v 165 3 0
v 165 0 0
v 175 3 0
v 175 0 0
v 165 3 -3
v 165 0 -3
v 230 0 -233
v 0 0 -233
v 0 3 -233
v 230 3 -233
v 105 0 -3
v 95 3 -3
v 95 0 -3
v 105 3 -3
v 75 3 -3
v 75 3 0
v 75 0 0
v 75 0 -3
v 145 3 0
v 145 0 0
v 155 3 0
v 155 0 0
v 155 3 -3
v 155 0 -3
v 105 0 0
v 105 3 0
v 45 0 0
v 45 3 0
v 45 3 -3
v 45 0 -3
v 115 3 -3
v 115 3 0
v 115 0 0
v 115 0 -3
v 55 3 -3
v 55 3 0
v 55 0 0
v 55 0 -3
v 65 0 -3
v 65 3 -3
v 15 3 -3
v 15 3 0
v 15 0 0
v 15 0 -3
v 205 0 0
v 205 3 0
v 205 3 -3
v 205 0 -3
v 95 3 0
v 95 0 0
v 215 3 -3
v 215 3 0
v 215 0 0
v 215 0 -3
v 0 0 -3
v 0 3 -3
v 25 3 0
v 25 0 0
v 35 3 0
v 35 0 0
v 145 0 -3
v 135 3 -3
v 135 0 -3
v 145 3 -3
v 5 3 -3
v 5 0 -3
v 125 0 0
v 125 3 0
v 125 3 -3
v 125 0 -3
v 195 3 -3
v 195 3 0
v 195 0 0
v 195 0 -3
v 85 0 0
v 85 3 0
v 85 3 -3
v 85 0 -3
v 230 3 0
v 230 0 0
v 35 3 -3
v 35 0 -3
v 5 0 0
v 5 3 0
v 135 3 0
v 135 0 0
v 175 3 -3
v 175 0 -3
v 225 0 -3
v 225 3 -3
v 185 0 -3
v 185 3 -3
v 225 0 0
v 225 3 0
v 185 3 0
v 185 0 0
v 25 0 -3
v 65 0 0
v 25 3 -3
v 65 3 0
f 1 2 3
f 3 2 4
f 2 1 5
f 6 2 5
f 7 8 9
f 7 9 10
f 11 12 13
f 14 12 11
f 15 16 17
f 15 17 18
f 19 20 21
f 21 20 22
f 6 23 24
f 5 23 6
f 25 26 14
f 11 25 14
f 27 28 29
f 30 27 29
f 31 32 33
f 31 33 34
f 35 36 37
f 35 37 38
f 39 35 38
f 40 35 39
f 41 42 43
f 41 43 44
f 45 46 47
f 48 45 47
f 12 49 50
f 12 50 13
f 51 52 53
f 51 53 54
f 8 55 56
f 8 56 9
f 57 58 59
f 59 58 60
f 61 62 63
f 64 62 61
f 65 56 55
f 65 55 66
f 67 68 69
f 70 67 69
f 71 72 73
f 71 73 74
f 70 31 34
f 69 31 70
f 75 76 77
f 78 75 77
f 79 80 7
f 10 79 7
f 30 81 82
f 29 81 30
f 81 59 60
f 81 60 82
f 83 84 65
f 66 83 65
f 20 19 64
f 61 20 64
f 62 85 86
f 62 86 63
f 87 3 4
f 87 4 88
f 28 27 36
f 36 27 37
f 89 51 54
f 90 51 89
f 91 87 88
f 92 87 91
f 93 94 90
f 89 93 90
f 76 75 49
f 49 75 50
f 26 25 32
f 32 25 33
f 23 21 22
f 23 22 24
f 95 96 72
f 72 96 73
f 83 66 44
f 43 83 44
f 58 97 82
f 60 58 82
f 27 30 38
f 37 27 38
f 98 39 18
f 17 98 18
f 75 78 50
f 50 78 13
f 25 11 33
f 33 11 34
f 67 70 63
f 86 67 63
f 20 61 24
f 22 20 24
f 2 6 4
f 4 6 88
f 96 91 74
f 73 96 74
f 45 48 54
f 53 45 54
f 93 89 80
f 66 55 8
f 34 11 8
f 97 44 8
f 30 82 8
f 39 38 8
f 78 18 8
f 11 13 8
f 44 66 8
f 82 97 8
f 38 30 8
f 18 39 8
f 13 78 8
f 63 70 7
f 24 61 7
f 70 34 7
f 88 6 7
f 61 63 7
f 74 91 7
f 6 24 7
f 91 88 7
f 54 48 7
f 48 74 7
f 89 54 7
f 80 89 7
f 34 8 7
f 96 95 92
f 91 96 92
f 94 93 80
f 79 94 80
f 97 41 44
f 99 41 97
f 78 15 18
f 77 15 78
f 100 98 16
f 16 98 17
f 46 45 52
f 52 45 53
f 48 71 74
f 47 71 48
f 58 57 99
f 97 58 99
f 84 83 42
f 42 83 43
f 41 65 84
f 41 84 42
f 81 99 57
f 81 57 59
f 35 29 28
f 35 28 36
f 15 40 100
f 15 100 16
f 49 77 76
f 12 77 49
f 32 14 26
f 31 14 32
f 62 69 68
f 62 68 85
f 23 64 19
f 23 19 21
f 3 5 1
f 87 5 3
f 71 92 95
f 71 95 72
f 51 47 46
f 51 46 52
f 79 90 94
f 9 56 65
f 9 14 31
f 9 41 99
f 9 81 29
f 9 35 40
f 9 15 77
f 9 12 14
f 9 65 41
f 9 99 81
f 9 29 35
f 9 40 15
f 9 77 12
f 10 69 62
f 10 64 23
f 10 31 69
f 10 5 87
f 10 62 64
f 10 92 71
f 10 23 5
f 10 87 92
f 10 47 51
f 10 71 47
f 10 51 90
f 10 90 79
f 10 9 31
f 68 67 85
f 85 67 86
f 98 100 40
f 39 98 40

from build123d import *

# Parameters (mm, degrees)
ESQUISSE1_W             = 230
ESQUISSE1_H             = 233
BASE_DEPTH              = 3
ENL_V_MAT_EXTRU_1_REACH = 5
ESQUISSE2_W             = 10
ESQUISSE2_H             = 3


with BuildPart() as part:
    # Esquisse1 → Base (new body)
    with BuildSketch(Plane(origin=(0, 0, 0), x_dir=(1, 0, 0), z_dir=(0, 1, 0))):
        with Locations((115, 116.5)):
            Rectangle(ESQUISSE1_W, ESQUISSE1_H)
    extrude(amount=BASE_DEPTH)

    # Esquisse2 → Enlèv. mat.-Extru.1 (cut, up to next)
    with BuildSketch(Plane(origin=(0, 3, 0), x_dir=(1, 0, 0), z_dir=(0, 1, 0)), mode=Mode.PRIVATE) as enl_v_mat_extru_1_sk1:
        with Locations((120, 1.5)):
            Rectangle(ESQUISSE2_W, ESQUISSE2_H)
    enl_v_mat_extru_1_tool1 = extrude(enl_v_mat_extru_1_sk1.sketch, amount=-ENL_V_MAT_EXTRU_1_REACH, mode=Mode.PRIVATE) & part.part
    add(enl_v_mat_extru_1_tool1.solids().sort_by_distance((120, 3, -1.5))[0], mode=Mode.SUBTRACT)
    # Esquisse2 → Enlèv. mat.-Extru.1 (cut, up to next)
    with BuildSketch(Plane(origin=(0, 3, 0), x_dir=(1, 0, 0), z_dir=(0, 1, 0)), mode=Mode.PRIVATE) as enl_v_mat_extru_1_sk2:
        with Locations((140, 1.5)):
            Rectangle(ESQUISSE2_W, ESQUISSE2_H)
    enl_v_mat_extru_1_tool2 = extrude(enl_v_mat_extru_1_sk2.sketch, amount=-ENL_V_MAT_EXTRU_1_REACH, mode=Mode.PRIVATE) & part.part
    add(enl_v_mat_extru_1_tool2.solids().sort_by_distance((140, 3, -1.5))[0], mode=Mode.SUBTRACT)
    # Esquisse2 → Enlèv. mat.-Extru.1 (cut, up to next)
    with BuildSketch(Plane(origin=(0, 3, 0), x_dir=(1, 0, 0), z_dir=(0, 1, 0)), mode=Mode.PRIVATE) as enl_v_mat_extru_1_sk3:
        with Locations((160, 1.5)):
            Rectangle(ESQUISSE2_W, ESQUISSE2_H)
    enl_v_mat_extru_1_tool3 = extrude(enl_v_mat_extru_1_sk3.sketch, amount=-ENL_V_MAT_EXTRU_1_REACH, mode=Mode.PRIVATE) & part.part
    add(enl_v_mat_extru_1_tool3.solids().sort_by_distance((160, 3, -1.5))[0], mode=Mode.SUBTRACT)
    # Esquisse2 → Enlèv. mat.-Extru.1 (cut, up to next)
    with BuildSketch(Plane(origin=(0, 3, 0), x_dir=(1, 0, 0), z_dir=(0, 1, 0)), mode=Mode.PRIVATE) as enl_v_mat_extru_1_sk4:
        with Locations((180, 1.5)):
            Rectangle(ESQUISSE2_W, ESQUISSE2_H)
    enl_v_mat_extru_1_tool4 = extrude(enl_v_mat_extru_1_sk4.sketch, amount=-ENL_V_MAT_EXTRU_1_REACH, mode=Mode.PRIVATE) & part.part
    add(enl_v_mat_extru_1_tool4.solids().sort_by_distance((180, 3, -1.5))[0], mode=Mode.SUBTRACT)
    # Esquisse2 → Enlèv. mat.-Extru.1 (cut, up to next)
    with BuildSketch(Plane(origin=(0, 3, 0), x_dir=(1, 0, 0), z_dir=(0, 1, 0)), mode=Mode.PRIVATE) as enl_v_mat_extru_1_sk5:
        with Locations((200, 1.5)):
            Rectangle(ESQUISSE2_W, ESQUISSE2_H)
    enl_v_mat_extru_1_tool5 = extrude(enl_v_mat_extru_1_sk5.sketch, amount=-ENL_V_MAT_EXTRU_1_REACH, mode=Mode.PRIVATE) & part.part
    add(enl_v_mat_extru_1_tool5.solids().sort_by_distance((200, 3, -1.5))[0], mode=Mode.SUBTRACT)
    # Esquisse2 → Enlèv. mat.-Extru.1 (cut, up to next)
    with BuildSketch(Plane(origin=(0, 3, 0), x_dir=(1, 0, 0), z_dir=(0, 1, 0)), mode=Mode.PRIVATE) as enl_v_mat_extru_1_sk6:
        with Locations((220, 1.5)):
            Rectangle(ESQUISSE2_W, ESQUISSE2_H)
    enl_v_mat_extru_1_tool6 = extrude(enl_v_mat_extru_1_sk6.sketch, amount=-ENL_V_MAT_EXTRU_1_REACH, mode=Mode.PRIVATE) & part.part
    add(enl_v_mat_extru_1_tool6.solids().sort_by_distance((220, 3, -1.5))[0], mode=Mode.SUBTRACT)
    # Esquisse2 → Enlèv. mat.-Extru.1 (cut, up to next)
    with BuildSketch(Plane(origin=(0, 3, 0), x_dir=(1, 0, 0), z_dir=(0, 1, 0)), mode=Mode.PRIVATE) as enl_v_mat_extru_1_sk7:
        with Locations((100, 1.5)):
            Rectangle(ESQUISSE2_W, ESQUISSE2_H)
    enl_v_mat_extru_1_tool7 = extrude(enl_v_mat_extru_1_sk7.sketch, amount=-ENL_V_MAT_EXTRU_1_REACH, mode=Mode.PRIVATE) & part.part
    add(enl_v_mat_extru_1_tool7.solids().sort_by_distance((100, 3, -1.5))[0], mode=Mode.SUBTRACT)
    # Esquisse2 → Enlèv. mat.-Extru.1 (cut, up to next)
    with BuildSketch(Plane(origin=(0, 3, 0), x_dir=(1, 0, 0), z_dir=(0, 1, 0)), mode=Mode.PRIVATE) as enl_v_mat_extru_1_sk8:
        with Locations((80, 1.5)):
            Rectangle(ESQUISSE2_W, ESQUISSE2_H)
    enl_v_mat_extru_1_tool8 = extrude(enl_v_mat_extru_1_sk8.sketch, amount=-ENL_V_MAT_EXTRU_1_REACH, mode=Mode.PRIVATE) & part.part
    add(enl_v_mat_extru_1_tool8.solids().sort_by_distance((80, 3, -1.5))[0], mode=Mode.SUBTRACT)
    # Esquisse2 → Enlèv. mat.-Extru.1 (cut, up to next)
    with BuildSketch(Plane(origin=(0, 3, 0), x_dir=(1, 0, 0), z_dir=(0, 1, 0)), mode=Mode.PRIVATE) as enl_v_mat_extru_1_sk9:
        with Locations((60, 1.5)):
            Rectangle(ESQUISSE2_W, ESQUISSE2_H)
    enl_v_mat_extru_1_tool9 = extrude(enl_v_mat_extru_1_sk9.sketch, amount=-ENL_V_MAT_EXTRU_1_REACH, mode=Mode.PRIVATE) & part.part
    add(enl_v_mat_extru_1_tool9.solids().sort_by_distance((60, 3, -1.5))[0], mode=Mode.SUBTRACT)
    # Esquisse2 → Enlèv. mat.-Extru.1 (cut, up to next)
    with BuildSketch(Plane(origin=(0, 3, 0), x_dir=(1, 0, 0), z_dir=(0, 1, 0)), mode=Mode.PRIVATE) as enl_v_mat_extru_1_sk10:
        with Locations((40, 1.5)):
            Rectangle(ESQUISSE2_W, ESQUISSE2_H)
    enl_v_mat_extru_1_tool10 = extrude(enl_v_mat_extru_1_sk10.sketch, amount=-ENL_V_MAT_EXTRU_1_REACH, mode=Mode.PRIVATE) & part.part
    add(enl_v_mat_extru_1_tool10.solids().sort_by_distance((40, 3, -1.5))[0], mode=Mode.SUBTRACT)
    # Esquisse2 → Enlèv. mat.-Extru.1 (cut, up to next)
    with BuildSketch(Plane(origin=(0, 3, 0), x_dir=(1, 0, 0), z_dir=(0, 1, 0)), mode=Mode.PRIVATE) as enl_v_mat_extru_1_sk11:
        with Locations((20, 1.5)):
            Rectangle(ESQUISSE2_W, ESQUISSE2_H)
    enl_v_mat_extru_1_tool11 = extrude(enl_v_mat_extru_1_sk11.sketch, amount=-ENL_V_MAT_EXTRU_1_REACH, mode=Mode.PRIVATE) & part.part
    add(enl_v_mat_extru_1_tool11.solids().sort_by_distance((20, 3, -1.5))[0], mode=Mode.SUBTRACT)
    # Esquisse2 → Enlèv. mat.-Extru.1 (cut, up to next)
    with BuildSketch(Plane(origin=(0, 3, 0), x_dir=(1, 0, 0), z_dir=(0, 1, 0)), mode=Mode.PRIVATE) as enl_v_mat_extru_1_sk12:
        with Locations((0, 1.5)):
            Rectangle(ESQUISSE2_W, ESQUISSE2_H)
    enl_v_mat_extru_1_tool12 = extrude(enl_v_mat_extru_1_sk12.sketch, amount=-ENL_V_MAT_EXTRU_1_REACH, mode=Mode.PRIVATE) & part.part
    add(enl_v_mat_extru_1_tool12.solids().sort_by_distance((0, 3, -1.5))[0], mode=Mode.SUBTRACT)


solid = part.part
